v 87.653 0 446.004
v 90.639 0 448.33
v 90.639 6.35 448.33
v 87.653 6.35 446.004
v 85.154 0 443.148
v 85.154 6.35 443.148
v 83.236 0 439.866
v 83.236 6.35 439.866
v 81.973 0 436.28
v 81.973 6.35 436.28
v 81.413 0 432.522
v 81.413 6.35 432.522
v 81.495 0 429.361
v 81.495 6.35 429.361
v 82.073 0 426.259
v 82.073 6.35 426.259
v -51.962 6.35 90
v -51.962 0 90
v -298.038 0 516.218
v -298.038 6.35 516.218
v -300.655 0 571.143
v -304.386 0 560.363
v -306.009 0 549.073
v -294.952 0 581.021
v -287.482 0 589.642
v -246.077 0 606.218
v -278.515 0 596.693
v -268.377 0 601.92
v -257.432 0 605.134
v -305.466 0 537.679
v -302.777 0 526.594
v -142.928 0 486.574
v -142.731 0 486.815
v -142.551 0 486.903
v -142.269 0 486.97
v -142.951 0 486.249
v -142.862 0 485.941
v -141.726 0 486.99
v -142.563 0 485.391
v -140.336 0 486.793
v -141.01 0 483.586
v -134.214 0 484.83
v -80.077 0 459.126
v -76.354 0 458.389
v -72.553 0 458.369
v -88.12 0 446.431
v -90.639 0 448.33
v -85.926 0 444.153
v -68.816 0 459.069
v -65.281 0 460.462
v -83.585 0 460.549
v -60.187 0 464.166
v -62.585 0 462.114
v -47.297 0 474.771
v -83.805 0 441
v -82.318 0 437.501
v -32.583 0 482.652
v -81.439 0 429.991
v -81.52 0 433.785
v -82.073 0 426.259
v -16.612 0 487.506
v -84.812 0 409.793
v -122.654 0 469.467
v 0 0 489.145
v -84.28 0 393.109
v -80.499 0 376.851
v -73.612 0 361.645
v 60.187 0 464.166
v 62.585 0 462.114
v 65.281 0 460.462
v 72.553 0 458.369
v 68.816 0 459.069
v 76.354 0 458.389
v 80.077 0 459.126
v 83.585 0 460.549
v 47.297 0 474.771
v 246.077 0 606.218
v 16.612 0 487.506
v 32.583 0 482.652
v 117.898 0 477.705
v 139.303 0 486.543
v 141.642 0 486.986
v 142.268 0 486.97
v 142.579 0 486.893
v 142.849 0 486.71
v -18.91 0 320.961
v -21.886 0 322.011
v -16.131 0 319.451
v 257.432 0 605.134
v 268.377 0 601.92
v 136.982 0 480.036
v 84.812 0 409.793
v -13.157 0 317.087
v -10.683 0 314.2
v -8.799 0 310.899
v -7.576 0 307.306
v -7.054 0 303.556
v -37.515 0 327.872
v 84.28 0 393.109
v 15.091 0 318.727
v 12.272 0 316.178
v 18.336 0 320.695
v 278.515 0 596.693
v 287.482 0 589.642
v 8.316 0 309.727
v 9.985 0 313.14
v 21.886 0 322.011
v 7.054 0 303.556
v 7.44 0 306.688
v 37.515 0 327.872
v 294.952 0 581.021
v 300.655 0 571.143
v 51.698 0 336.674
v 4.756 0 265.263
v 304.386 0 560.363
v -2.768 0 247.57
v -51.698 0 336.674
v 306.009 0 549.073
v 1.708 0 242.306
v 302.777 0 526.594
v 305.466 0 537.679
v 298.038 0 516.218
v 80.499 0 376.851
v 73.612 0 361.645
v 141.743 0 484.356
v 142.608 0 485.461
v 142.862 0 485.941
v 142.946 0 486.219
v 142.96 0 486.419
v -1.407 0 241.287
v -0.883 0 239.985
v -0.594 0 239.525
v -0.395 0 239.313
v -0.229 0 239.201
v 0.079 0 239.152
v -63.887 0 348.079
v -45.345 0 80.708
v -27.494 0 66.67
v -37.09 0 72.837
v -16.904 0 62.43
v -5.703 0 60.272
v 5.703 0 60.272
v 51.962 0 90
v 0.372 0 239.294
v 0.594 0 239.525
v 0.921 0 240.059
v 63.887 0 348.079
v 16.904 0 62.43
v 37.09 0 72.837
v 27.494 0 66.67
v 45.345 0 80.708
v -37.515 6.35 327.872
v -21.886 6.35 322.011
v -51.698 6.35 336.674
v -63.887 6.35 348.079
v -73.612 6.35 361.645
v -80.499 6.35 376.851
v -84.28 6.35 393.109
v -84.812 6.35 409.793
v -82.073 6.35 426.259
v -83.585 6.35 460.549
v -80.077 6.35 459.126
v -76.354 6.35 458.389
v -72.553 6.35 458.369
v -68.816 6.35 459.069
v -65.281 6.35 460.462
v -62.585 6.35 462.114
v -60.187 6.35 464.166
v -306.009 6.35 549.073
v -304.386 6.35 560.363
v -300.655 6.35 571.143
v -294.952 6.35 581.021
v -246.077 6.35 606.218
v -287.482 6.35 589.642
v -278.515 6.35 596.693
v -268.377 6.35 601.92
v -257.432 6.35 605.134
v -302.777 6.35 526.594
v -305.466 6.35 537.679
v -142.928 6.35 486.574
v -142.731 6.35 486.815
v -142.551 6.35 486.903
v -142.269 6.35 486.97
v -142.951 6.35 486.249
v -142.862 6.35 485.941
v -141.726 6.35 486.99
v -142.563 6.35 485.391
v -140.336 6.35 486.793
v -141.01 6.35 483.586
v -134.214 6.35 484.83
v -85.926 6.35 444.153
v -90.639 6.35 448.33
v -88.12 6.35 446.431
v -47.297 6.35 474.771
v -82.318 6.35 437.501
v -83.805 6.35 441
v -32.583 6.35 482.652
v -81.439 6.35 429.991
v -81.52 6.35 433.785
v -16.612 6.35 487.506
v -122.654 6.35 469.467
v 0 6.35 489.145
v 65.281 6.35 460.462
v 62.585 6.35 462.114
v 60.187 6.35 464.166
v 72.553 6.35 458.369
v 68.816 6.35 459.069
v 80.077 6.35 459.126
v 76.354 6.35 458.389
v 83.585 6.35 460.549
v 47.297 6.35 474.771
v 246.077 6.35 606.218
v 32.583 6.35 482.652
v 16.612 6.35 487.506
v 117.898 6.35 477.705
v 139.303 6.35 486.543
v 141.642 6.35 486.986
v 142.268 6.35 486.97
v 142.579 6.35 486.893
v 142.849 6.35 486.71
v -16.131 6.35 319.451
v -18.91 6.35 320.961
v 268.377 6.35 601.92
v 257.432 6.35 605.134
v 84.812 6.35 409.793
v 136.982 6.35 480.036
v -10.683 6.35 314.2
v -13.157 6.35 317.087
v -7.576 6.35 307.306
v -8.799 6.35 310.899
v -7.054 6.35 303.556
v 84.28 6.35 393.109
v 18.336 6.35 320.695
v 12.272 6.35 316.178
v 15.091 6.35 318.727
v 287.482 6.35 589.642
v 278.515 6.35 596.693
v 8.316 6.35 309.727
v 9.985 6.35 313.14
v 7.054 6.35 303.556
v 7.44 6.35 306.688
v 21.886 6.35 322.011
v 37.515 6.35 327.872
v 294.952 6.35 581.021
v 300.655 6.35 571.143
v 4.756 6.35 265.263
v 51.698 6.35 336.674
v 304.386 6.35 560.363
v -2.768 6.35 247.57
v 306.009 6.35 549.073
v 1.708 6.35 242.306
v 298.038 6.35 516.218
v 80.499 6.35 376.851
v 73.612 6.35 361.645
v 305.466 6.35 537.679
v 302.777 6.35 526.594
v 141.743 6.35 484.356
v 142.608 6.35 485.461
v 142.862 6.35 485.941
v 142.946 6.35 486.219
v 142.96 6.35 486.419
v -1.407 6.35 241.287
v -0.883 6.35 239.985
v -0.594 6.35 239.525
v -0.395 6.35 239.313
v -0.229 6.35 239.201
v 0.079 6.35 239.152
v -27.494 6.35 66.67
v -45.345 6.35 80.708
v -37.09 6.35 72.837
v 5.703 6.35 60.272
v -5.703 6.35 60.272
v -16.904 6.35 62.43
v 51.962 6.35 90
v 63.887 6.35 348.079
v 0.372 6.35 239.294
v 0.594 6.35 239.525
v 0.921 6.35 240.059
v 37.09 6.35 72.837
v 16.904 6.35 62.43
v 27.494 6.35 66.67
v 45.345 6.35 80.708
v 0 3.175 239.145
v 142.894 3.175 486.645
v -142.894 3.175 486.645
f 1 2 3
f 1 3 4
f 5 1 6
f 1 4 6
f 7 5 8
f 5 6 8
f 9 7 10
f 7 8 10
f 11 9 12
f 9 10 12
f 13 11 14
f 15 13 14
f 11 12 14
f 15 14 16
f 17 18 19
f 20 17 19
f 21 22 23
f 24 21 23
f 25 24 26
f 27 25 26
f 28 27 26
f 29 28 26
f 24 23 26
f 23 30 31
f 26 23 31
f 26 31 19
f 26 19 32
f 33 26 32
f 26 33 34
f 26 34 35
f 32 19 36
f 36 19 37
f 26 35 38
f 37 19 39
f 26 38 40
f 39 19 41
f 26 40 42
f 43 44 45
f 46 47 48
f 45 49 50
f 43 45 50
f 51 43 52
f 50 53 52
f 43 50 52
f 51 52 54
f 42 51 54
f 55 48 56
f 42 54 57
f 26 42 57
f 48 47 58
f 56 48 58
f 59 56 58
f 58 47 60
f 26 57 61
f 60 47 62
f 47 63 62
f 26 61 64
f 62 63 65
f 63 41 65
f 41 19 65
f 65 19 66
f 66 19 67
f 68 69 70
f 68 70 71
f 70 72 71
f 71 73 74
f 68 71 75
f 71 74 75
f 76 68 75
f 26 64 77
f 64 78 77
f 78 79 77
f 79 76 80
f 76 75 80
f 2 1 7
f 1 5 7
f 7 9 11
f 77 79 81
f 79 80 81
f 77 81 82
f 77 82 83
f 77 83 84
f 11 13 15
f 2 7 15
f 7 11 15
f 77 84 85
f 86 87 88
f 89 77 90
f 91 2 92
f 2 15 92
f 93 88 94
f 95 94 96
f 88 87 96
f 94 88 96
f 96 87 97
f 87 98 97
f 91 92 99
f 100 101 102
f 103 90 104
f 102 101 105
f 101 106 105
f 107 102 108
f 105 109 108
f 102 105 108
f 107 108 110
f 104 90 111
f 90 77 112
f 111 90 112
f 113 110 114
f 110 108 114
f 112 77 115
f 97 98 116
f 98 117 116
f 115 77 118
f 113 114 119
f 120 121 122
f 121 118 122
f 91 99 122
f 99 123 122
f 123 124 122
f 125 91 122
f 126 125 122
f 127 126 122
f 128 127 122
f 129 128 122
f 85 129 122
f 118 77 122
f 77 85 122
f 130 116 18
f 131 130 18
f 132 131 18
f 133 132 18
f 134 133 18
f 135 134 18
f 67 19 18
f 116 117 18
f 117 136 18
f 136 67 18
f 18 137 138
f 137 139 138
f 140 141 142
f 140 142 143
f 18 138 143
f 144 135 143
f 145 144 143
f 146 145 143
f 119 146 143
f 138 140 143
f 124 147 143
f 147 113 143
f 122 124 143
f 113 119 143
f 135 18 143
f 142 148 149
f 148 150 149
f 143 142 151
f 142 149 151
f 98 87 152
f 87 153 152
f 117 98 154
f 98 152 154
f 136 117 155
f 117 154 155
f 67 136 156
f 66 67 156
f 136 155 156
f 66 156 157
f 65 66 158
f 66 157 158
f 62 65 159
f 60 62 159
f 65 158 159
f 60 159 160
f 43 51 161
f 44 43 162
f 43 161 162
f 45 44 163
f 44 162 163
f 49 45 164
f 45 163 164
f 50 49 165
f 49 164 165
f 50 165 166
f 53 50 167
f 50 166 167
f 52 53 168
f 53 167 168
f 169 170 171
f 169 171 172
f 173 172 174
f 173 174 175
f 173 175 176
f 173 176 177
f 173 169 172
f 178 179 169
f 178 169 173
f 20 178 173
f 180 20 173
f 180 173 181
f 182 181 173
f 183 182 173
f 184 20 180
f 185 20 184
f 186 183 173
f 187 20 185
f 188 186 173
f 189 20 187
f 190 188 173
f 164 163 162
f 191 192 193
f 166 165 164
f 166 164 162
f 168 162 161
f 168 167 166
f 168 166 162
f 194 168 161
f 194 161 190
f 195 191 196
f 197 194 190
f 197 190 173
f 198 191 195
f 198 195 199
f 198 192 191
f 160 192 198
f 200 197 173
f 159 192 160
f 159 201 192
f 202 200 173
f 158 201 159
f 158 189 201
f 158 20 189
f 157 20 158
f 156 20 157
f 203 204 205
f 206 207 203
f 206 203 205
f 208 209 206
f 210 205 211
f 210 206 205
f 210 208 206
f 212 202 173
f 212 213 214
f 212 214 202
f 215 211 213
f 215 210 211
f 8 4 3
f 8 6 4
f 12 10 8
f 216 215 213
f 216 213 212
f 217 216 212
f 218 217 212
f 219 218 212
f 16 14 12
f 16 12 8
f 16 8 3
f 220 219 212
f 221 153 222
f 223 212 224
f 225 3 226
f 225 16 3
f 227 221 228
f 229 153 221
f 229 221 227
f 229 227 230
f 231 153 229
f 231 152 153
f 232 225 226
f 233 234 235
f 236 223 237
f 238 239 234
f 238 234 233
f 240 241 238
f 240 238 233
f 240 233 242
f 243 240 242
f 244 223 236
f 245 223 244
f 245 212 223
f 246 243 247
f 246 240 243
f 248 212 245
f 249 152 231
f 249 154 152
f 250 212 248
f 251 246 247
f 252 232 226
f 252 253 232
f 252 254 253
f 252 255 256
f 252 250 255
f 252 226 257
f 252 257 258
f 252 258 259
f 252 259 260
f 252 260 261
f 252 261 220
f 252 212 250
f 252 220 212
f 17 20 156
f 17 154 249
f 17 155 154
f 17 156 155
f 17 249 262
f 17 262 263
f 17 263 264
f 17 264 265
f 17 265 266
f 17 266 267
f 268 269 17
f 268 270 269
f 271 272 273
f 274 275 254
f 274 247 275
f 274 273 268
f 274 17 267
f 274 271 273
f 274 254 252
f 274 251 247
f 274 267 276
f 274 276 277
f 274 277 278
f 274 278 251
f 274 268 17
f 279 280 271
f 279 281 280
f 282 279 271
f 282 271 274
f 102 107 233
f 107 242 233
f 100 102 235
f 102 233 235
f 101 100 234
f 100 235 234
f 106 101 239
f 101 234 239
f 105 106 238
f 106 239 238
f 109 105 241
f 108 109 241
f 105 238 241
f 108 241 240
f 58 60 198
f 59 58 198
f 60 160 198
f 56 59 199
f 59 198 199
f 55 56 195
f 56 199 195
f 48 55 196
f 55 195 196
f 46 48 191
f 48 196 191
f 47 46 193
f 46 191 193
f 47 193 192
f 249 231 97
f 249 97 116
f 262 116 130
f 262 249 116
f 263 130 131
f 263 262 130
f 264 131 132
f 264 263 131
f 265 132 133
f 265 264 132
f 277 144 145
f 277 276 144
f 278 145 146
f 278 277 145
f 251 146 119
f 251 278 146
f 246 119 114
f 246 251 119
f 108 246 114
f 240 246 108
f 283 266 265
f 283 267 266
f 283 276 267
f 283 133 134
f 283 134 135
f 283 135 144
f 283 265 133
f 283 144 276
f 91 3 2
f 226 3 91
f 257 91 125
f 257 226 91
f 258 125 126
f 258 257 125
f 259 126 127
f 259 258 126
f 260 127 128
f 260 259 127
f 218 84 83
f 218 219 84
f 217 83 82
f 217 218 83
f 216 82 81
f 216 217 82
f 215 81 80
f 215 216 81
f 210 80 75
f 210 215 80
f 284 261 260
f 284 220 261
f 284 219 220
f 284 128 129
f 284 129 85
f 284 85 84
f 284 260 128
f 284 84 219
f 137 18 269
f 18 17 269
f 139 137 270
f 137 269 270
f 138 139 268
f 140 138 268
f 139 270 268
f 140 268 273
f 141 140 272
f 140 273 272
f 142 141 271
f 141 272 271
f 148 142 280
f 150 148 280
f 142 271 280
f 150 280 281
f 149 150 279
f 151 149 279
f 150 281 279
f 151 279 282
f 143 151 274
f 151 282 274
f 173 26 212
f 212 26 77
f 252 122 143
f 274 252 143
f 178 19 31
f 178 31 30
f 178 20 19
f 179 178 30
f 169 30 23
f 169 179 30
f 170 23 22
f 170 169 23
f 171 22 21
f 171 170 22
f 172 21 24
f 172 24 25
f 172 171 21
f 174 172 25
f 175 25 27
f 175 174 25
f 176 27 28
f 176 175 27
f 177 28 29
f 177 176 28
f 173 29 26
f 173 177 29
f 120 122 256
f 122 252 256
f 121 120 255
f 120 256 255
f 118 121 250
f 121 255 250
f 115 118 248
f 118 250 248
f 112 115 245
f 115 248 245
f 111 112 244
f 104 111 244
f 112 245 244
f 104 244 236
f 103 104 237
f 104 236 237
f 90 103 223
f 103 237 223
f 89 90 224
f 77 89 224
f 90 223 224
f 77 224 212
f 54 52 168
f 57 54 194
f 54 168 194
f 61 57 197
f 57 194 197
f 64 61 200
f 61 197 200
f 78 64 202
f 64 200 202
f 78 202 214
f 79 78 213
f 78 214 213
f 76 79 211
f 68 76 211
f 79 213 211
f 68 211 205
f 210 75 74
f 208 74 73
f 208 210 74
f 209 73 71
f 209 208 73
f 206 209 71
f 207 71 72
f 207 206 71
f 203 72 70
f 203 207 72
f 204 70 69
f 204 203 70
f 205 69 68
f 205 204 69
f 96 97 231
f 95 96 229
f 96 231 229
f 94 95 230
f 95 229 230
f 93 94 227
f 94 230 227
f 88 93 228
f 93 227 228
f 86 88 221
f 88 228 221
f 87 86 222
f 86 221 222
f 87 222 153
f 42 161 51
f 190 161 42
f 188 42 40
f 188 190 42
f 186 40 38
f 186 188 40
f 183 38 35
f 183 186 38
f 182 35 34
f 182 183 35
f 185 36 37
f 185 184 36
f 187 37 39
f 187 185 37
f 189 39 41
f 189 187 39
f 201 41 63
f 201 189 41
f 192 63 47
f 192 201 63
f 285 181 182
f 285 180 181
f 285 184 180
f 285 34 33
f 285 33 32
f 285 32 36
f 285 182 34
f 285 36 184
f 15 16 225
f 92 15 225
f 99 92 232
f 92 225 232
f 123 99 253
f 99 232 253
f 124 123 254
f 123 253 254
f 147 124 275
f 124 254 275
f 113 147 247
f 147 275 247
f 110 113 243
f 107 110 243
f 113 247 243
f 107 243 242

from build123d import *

# Parameters (mm, degrees)
BOSS_EXTRUDE1_DEPTH = 6.35
SKETCH2_R           = 85
CUT_EXTRUDE1_DEPTH  = 6.35
FILLET1_R           = 60
CUT_EXTRUDE2_DEPTH  = 6.35
FILLET2_R           = 20


with BuildPart() as part:
    # Sketch1 → Boss-Extrude1 (new body)
    with BuildSketch(Plane(origin=(0, 0, 0), x_dir=(1, 0, 0), z_dir=(0, 1, 0))):
        Polygon((0, 0), (-350, -606.217782649), (350, -606.217782649), align=None)
    extrude(amount=BOSS_EXTRUDE1_DEPTH)

    # Sketch2 → Cut-Extrude1 (cut)
    with BuildSketch(Plane(origin=(0, 6.35, 0), x_dir=(1, 0, 0), z_dir=(0, 1, 0))):
        with Locations(Location((0, -404.145188433, 0), (0, 0, 270))):
            Circle(SKETCH2_R)
    extrude(amount=-CUT_EXTRUDE1_DEPTH, mode=Mode.SUBTRACT)

    # Fillet1
    fillet1_edges = [part.edges().sort_by_distance(p)[0] for p in [
        (350, 3.175, 606.217782649),
        (-350, 3.175, 606.217782649),
        (0, 3.175, 0),
    ]]
    fillet(fillet1_edges, radius=FILLET1_R)

    # Sketch3 → Cut-Extrude2 (cut)
    with BuildSketch(Plane(origin=(0, 6.35, 0), x_dir=(1, 0, 0), z_dir=(0, 1, 0))):
        with BuildLine():
            Line((30.480762114, -411.350959799), (21.480762114, -426.939417067))
            add(Edge.make_bspline(
                [(30.480762114, -411.350959799), (545.596004384, -719.145188433), (21.480762114, -426.939417067)],
                knots=[0, 0, 0, 1, 1, 1], degree=2, weights=[1, 0.290322581, 1]))
        make_face()
        with BuildLine():
            Line((-9, -374.145188433), (9, -374.145188433))
            add(Edge.make_bspline(
                [(-9, -374.145188433), (0, 225.854811567), (9, -374.145188433)],
                knots=[0, 0, 0, 1, 1, 1], degree=2, weights=[1, 0.290322581, 1]))
        make_face()
        with BuildLine():
            Line((-21.480762114, -426.939417067), (-30.480762114, -411.350959799))
            add(Edge.make_bspline(
                [(-21.480762114, -426.939417067), (-545.596004384, -719.145188433), (-30.480762114, -411.350959799)],
                knots=[0, 0, 0, 1, 1, 1], degree=2, weights=[1, 0.290322581, 1]))
        make_face()
    extrude(amount=-CUT_EXTRUDE2_DEPTH, mode=Mode.SUBTRACT)

    # Fillet2
    fillet2_edges = [part.edges().sort_by_distance(p)[0] for p in [
        (-7.677401055, 3.175, 319.492618991),
        (7.677401055, 3.175, 319.492618991),
        (77.149976159, 3.175, 439.822648805),
        (69.472575104, 3.175, 453.120297502),
        (-69.472575104, 3.175, 453.120297502),
        (-77.149976159, 3.175, 439.822648805),
    ]]
    fillet(fillet2_edges, radius=FILLET2_R)


solid = part.part
